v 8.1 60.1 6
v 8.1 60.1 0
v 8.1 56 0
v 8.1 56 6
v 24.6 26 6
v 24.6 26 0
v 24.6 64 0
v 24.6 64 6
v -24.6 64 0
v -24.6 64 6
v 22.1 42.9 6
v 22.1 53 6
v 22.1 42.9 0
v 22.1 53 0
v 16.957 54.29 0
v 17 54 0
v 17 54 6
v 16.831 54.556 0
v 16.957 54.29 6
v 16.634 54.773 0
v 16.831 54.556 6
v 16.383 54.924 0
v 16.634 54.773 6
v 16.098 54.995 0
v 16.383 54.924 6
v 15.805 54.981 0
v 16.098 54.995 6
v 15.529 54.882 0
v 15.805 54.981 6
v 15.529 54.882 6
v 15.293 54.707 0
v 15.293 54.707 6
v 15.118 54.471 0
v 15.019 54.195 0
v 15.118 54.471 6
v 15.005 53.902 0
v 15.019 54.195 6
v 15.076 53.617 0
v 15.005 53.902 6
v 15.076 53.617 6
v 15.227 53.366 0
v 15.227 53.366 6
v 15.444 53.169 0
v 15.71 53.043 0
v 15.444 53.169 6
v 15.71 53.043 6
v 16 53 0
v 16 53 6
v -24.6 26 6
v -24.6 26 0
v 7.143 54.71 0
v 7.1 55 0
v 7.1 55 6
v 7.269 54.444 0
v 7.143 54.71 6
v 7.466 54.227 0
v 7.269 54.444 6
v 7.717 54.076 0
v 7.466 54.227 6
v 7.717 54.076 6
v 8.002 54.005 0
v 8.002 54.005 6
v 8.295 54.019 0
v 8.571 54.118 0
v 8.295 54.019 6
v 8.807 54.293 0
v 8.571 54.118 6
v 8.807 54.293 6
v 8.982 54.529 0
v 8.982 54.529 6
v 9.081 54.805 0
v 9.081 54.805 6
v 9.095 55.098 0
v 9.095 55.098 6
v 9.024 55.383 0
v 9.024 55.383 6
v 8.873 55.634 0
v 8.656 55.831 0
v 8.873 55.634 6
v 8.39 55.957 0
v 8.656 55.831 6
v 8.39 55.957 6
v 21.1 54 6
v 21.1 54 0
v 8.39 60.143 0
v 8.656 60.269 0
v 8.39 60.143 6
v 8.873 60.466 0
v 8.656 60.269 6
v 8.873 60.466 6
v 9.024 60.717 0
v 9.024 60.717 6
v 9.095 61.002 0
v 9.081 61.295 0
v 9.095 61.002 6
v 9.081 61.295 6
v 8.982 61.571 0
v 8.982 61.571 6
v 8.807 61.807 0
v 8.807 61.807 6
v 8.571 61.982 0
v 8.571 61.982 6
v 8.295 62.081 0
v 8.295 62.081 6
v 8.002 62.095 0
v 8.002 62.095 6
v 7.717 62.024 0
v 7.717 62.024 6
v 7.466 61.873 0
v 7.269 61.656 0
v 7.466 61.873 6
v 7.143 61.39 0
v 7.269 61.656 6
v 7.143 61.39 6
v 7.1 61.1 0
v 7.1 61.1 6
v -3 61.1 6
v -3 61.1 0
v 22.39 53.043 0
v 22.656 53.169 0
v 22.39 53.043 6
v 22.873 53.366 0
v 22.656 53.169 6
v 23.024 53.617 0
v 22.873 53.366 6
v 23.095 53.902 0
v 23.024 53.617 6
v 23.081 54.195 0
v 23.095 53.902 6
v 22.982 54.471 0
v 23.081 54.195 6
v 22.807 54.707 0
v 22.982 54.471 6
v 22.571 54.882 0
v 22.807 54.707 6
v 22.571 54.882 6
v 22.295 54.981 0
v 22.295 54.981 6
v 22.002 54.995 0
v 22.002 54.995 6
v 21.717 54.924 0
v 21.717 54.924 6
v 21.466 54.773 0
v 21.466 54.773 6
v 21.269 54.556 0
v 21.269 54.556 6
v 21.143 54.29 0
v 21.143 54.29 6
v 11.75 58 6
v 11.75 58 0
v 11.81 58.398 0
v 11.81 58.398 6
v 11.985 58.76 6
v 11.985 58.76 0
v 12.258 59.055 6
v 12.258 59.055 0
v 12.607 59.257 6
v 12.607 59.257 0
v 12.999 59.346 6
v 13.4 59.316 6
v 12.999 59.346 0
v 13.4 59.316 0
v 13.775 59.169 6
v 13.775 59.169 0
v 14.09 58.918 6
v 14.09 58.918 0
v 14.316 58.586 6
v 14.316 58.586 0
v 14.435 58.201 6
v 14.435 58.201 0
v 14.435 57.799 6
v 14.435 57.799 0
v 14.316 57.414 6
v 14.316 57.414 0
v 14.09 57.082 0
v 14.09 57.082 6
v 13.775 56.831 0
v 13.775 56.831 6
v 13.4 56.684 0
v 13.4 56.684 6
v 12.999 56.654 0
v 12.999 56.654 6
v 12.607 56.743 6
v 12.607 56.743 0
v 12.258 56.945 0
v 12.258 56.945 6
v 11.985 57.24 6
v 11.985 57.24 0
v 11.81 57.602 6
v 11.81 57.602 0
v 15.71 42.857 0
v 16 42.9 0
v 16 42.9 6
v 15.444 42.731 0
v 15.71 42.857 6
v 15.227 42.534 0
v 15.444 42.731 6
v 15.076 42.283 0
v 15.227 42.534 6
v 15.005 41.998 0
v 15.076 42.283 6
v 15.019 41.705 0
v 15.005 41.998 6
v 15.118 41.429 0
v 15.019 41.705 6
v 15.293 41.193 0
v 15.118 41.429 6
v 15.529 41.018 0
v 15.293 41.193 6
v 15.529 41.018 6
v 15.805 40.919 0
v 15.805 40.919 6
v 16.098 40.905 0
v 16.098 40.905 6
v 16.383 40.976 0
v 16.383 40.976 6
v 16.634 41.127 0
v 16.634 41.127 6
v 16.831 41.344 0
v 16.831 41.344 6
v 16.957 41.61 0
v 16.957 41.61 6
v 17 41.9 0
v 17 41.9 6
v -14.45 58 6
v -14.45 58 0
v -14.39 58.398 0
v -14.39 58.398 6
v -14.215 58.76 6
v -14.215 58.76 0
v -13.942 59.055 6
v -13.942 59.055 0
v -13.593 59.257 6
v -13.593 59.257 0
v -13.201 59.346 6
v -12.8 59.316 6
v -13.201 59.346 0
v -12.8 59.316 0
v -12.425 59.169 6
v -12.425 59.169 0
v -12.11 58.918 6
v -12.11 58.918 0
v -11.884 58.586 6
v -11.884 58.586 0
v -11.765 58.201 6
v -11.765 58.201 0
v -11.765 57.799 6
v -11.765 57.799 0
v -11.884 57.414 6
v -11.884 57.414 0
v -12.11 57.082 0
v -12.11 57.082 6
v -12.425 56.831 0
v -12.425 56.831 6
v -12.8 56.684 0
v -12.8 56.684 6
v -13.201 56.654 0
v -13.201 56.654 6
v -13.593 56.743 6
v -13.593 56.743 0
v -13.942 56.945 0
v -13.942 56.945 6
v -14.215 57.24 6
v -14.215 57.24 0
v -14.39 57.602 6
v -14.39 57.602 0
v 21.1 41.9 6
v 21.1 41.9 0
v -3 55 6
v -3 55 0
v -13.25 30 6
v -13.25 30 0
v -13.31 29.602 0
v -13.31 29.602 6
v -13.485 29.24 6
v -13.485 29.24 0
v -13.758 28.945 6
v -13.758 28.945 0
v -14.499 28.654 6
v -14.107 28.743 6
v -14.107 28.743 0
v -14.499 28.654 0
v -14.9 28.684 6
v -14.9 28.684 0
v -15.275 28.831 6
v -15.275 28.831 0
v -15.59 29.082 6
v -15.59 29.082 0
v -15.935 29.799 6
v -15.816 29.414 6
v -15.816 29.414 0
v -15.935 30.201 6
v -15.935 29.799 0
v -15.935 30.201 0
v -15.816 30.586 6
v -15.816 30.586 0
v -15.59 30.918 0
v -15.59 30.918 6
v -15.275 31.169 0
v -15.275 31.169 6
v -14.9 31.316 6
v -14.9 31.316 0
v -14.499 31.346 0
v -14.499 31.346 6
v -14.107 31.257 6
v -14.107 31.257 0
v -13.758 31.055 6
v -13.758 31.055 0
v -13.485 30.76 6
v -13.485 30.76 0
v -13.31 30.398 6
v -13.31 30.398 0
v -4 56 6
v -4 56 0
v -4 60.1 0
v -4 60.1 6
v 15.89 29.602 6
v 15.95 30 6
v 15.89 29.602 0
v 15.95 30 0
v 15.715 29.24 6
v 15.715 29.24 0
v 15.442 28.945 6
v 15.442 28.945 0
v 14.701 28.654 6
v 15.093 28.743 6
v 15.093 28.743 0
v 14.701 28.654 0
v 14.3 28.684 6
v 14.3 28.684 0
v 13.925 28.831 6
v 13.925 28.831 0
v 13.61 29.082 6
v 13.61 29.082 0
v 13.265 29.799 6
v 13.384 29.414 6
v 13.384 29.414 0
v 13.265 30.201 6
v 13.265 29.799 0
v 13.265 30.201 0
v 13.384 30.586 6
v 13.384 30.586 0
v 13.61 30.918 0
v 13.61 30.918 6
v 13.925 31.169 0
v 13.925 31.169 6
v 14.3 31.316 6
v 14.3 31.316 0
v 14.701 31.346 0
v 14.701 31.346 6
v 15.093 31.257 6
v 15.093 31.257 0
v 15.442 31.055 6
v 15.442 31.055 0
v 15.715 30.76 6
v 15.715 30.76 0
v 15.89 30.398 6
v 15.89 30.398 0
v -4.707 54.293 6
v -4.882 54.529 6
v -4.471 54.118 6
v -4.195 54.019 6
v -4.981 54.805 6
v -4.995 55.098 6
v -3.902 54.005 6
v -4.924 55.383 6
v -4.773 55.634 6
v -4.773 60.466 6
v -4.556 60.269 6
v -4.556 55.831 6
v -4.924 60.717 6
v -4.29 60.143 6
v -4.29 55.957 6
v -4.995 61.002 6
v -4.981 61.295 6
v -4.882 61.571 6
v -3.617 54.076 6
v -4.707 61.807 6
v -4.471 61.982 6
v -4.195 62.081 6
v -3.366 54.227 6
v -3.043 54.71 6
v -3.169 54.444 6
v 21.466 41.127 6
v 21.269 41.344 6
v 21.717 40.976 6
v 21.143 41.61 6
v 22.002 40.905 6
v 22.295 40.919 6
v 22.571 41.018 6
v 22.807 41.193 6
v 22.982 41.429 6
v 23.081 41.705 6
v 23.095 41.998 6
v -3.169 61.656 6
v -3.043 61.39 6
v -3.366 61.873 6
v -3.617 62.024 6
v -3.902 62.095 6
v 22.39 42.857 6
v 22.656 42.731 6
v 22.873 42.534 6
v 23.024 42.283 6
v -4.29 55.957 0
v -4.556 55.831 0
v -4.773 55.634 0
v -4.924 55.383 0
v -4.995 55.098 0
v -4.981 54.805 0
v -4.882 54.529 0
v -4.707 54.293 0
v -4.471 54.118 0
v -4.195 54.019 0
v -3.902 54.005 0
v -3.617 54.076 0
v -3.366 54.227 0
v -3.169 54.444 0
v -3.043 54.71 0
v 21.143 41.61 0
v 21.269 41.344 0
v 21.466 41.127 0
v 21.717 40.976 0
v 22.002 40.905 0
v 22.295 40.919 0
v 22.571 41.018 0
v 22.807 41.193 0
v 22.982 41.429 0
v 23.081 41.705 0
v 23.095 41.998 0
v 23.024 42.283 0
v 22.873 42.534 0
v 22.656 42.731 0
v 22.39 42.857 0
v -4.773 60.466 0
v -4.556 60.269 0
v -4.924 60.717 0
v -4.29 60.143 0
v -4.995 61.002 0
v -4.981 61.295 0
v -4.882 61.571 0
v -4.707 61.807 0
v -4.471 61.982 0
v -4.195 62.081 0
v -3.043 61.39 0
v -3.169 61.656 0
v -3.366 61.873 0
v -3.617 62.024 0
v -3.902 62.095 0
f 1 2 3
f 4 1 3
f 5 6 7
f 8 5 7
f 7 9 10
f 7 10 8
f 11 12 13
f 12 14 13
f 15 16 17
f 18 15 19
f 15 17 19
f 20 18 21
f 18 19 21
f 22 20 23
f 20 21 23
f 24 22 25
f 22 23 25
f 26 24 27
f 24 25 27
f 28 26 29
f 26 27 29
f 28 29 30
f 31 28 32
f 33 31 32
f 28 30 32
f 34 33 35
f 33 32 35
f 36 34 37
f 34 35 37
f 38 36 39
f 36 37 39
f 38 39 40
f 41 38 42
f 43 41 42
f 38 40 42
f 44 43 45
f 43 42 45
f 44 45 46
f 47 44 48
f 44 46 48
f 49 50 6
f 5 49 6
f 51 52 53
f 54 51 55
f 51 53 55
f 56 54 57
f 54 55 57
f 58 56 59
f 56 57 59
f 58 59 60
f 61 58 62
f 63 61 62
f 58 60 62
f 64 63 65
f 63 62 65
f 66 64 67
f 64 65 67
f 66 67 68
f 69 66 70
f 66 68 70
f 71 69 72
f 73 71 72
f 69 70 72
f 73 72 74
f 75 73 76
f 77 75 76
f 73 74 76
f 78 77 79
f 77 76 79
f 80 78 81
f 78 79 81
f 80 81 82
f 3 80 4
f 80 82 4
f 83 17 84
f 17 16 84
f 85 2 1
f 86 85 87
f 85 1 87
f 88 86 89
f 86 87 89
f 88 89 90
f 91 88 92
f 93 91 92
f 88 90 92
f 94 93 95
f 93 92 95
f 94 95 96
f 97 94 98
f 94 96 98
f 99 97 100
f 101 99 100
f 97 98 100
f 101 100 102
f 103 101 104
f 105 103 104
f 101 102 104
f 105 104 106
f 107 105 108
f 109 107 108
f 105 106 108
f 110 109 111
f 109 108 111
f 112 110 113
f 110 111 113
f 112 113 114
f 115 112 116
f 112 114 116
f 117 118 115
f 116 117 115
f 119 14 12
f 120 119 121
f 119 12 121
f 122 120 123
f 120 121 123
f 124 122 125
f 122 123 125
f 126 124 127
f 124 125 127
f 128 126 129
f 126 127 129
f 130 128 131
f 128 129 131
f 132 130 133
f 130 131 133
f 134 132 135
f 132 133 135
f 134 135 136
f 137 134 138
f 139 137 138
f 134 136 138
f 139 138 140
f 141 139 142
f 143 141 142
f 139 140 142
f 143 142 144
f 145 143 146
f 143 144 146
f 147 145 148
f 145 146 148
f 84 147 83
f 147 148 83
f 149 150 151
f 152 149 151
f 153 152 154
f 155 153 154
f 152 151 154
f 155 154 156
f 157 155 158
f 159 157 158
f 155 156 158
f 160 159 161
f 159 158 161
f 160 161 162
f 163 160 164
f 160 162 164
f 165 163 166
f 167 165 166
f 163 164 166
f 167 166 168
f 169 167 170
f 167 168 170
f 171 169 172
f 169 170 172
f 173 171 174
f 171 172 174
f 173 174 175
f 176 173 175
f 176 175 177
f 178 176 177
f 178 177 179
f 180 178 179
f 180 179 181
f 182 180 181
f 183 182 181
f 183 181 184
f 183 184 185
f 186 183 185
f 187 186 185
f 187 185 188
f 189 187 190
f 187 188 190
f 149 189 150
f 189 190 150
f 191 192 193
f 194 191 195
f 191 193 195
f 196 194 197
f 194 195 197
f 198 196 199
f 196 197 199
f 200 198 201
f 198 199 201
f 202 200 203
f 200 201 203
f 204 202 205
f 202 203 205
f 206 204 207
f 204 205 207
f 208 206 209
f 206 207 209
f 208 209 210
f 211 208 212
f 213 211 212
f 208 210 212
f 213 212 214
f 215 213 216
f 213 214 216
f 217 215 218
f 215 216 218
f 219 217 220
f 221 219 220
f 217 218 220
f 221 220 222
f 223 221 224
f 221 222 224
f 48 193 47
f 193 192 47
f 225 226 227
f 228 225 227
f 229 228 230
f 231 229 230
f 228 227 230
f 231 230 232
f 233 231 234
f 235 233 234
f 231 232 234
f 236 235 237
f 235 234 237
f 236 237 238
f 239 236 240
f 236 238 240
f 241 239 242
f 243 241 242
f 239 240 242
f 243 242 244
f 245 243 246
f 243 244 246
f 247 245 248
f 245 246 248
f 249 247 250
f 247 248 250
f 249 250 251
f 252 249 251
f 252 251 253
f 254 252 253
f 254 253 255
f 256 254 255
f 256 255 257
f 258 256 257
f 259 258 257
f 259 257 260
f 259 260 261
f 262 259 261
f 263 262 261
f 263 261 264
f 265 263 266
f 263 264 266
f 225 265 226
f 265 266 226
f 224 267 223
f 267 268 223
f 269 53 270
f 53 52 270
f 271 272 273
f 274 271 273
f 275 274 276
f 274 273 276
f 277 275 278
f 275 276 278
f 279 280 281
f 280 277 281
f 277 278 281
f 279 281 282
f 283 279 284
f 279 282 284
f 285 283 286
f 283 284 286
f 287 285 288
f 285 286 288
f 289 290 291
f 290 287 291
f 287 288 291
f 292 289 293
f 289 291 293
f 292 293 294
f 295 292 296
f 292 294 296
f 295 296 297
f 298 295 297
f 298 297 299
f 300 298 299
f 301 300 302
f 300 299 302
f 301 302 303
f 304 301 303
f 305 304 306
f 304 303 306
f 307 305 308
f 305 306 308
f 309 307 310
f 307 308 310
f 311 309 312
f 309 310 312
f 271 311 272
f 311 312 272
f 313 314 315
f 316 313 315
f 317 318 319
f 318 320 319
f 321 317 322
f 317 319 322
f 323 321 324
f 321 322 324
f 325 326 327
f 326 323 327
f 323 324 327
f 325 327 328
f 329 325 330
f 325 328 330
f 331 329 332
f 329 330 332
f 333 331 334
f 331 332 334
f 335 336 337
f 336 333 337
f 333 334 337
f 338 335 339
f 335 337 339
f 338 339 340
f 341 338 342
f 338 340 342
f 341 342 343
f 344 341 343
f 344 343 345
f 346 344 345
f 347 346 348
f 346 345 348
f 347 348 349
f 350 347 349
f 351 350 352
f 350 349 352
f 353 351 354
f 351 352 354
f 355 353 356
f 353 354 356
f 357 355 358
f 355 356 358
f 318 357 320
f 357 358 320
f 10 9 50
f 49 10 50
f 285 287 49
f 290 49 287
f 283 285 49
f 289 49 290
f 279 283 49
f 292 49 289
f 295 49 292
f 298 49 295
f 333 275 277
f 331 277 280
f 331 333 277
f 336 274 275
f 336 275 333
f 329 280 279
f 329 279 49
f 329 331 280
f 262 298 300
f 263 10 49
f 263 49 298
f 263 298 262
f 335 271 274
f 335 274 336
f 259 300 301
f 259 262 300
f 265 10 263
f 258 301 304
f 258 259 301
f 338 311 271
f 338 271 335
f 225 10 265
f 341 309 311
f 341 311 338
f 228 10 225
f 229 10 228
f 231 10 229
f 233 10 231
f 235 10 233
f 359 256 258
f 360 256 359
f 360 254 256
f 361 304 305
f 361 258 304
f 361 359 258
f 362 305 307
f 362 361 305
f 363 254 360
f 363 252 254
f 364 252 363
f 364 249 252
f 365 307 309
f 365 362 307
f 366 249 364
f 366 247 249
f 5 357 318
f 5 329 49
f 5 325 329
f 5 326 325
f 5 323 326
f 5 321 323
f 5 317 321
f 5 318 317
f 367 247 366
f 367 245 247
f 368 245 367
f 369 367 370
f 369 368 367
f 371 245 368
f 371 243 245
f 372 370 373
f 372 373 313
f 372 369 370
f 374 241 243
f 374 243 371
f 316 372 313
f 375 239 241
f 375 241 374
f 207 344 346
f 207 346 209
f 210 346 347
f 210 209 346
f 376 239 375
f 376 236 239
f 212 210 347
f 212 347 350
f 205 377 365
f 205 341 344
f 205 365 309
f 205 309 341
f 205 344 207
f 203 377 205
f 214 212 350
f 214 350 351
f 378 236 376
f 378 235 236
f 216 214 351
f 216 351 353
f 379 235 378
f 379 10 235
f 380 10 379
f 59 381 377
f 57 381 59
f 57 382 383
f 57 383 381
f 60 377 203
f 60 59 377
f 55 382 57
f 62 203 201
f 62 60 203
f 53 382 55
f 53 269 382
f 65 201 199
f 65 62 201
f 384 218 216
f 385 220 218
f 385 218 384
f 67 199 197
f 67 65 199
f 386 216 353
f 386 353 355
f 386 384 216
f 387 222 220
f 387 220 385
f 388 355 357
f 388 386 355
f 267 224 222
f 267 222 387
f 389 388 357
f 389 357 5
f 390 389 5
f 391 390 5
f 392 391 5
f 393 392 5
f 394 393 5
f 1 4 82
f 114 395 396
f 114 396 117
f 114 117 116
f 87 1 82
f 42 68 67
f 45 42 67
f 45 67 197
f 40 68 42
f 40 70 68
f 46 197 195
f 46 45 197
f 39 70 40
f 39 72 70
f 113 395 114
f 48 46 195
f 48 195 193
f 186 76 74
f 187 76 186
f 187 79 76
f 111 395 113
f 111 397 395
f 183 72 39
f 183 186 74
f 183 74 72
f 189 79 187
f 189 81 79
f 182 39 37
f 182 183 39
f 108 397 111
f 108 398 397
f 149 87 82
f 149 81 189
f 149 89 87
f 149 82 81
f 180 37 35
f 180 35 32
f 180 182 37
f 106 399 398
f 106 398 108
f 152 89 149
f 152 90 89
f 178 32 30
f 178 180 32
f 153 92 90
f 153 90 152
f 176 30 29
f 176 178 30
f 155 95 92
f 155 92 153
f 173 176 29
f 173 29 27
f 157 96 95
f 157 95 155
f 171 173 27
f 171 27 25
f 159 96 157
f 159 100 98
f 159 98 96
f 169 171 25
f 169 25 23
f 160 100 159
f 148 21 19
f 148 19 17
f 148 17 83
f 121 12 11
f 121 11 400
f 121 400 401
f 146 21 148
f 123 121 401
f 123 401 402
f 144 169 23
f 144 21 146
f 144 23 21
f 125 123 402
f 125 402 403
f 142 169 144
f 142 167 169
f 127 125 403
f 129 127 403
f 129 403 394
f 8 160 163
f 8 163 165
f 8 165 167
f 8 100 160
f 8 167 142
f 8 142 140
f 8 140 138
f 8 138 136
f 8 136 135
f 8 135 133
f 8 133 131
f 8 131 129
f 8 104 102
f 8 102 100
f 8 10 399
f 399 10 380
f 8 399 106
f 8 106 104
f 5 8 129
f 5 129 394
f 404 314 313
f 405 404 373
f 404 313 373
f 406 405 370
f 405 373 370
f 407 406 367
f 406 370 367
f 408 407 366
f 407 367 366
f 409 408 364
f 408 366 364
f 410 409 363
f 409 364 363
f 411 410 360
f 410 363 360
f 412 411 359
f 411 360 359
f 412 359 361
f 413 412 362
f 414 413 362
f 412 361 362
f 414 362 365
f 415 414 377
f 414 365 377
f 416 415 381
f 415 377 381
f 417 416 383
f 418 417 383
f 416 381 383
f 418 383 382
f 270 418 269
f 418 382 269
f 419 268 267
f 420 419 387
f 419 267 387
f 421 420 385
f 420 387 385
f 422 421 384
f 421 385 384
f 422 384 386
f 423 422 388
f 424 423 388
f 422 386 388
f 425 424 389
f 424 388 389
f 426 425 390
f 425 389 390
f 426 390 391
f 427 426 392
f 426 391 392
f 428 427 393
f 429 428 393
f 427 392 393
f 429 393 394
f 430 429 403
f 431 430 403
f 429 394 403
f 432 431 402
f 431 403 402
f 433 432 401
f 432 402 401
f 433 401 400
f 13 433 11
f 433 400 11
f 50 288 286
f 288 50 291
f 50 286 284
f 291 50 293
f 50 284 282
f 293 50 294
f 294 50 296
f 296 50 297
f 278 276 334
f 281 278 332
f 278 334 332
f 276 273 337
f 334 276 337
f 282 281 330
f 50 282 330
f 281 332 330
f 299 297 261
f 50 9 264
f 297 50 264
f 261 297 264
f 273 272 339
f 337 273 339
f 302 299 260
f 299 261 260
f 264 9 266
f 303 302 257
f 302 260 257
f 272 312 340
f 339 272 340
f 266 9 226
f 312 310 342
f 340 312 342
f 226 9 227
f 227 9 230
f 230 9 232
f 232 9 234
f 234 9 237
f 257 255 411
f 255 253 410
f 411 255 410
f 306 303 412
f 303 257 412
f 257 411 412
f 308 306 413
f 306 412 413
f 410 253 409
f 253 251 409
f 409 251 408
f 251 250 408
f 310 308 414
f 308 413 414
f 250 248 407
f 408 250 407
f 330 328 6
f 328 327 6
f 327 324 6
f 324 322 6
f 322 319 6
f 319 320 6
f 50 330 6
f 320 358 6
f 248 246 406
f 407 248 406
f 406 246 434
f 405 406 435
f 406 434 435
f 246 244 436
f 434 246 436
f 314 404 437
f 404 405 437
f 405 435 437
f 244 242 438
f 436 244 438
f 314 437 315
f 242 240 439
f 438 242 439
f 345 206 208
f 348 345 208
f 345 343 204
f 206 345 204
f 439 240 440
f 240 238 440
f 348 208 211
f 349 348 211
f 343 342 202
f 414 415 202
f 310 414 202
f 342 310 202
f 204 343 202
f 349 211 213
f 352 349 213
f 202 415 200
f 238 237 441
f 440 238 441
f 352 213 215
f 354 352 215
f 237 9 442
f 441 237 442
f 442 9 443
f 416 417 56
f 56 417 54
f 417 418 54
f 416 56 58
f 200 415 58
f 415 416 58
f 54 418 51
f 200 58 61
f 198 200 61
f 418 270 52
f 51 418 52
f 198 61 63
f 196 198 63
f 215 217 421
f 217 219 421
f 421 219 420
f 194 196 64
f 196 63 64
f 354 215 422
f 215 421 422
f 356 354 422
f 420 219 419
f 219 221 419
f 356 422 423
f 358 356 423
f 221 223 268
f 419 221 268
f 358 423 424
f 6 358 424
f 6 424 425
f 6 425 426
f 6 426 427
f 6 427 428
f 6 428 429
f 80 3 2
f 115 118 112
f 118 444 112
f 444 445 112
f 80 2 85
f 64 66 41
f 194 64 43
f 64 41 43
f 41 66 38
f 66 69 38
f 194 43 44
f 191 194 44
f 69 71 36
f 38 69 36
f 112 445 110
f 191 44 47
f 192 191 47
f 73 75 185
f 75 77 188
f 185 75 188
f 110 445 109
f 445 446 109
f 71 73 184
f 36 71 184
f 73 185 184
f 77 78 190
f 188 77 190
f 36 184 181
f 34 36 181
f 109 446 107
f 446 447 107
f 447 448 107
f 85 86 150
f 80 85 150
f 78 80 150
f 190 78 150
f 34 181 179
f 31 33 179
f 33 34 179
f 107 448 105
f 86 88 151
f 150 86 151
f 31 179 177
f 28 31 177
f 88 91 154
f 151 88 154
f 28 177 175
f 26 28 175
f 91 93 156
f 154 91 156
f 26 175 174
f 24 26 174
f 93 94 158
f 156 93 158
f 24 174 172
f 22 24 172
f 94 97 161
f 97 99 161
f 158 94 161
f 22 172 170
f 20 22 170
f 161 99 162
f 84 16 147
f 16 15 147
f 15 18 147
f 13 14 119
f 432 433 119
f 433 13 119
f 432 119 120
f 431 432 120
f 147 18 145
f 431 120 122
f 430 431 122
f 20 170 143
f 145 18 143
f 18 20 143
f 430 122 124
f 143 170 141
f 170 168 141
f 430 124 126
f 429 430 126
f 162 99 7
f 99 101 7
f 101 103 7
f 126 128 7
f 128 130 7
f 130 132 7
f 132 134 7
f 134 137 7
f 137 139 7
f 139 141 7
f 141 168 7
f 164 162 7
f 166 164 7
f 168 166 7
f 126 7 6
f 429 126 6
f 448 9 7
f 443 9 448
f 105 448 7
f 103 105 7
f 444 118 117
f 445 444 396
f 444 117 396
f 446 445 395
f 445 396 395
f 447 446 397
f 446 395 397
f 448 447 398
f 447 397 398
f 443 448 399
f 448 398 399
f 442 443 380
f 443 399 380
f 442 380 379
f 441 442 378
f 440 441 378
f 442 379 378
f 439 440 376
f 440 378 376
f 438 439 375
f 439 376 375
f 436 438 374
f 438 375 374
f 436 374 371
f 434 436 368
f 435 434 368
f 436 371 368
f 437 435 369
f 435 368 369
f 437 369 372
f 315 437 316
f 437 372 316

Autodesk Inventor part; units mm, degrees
ref_plane "YZ Plane" through (0, 0, 0) normal (1, 0, 0) x (0, 1, 0)
ref_plane "XZ Plane" through (0, 0, 0) normal (0, 1, 0) x (-1, 0, 0)
ref_plane "XY Plane" through (0, 0, 0) normal (0, 0, 1) x (1, 0, 0)
ref_plane "작업 평면1" through (0, 0, 0) normal (0, 0, 1) x (1, 0, 0)
sketch "스케치1" plane through (0, 0, 0) normal (0, 0, 1) x (1, 0, 0)
  line L0 (14.6, 27) -> (14.6, -35) projected
  line L1 (14.6, -35) -> (24.6, -35) projected
  line L2 (24.6, -35) -> (24.6, 35) projected
  line L3 (24.6, 35) -> (-24.6, 35) projected
  line L4 (-24.6, 35) -> (-24.6, -35) projected
  line L5 (-24.6, -35) -> (-14.6, -35) projected
  line L6 (-14.6, -35) -> (-14.6, 27) projected
  line L7 (-14.6, 27) -> (14.6, 27) projected
  circle A0 centre (-14.6, 30) radius 1.35 projected
  circle A1 centre (14.6, 30) radius 1.35 projected
  circle A2 centre (-17.3, -31) radius 1.35 projected
  circle A3 centre (-17.3, 13) radius 1.35 projected
  circle A4 centre (-17.3, -9) radius 1.35 projected
  circle A5 centre (17.3, -9) radius 1.35 projected
  circle A6 centre (17.3, 13) radius 1.35 projected
  circle A7 centre (17.3, -31) radius 1.35 projected
  line L8 (-24.6, 26) -> (24.6, 26)
  line L9 (24.6, 26) -> (24.6, 64)
  line L10 (-24.6, 64) -> (-24.6, 26)
  line L11 (22.1, 41.9) -> (16, 41.9)
  line L12 (16, 41.9) -> (16, 54)
  line L13 (16, 54) -> (22.1, 54)
  line L14 (22.1, 54) -> (22.1, 41.9)
  line L15 (8.1, 55) -> (-4, 55)
  line L16 (-4, 55) -> (-4, 61.1)
  line L17 (-4, 61.1) -> (8.1, 61.1)
  line L18 (8.1, 61.1) -> (8.1, 55)
  line L19 (-4, 64) -> (24.6, 64)
  line L20 (-24.6, 64) -> (-4, 64)
  point P0 (0, 0)
  dimension "d1" = 6.1
  dimension "d2" = 12.1
  dimension "d11" = 6.1
extrude "돌출2" add sketch "스케치1" along normal blind 6 contours L7 L6 L8 L4 L3 L2 L0 | L0 L8 L6 L7 | L3 L10 L20 L19 L9
sketch "스케치2" plane through (0, 0, 0) normal (0, 0, -1) x (-1, 0, 0)
  line L0 (-8.1, 61.1) -> (-8.1, 55) projected
  circle A0 centre (-13.1, 58) radius 1.35
  circle A1 centre (13.1, 58) radius 1.35
  point P0 (0, 0)
  dimension "d14" = 2.7
  dimension "d15" = 2.7
extrude "돌출3" cut sketch "스케치2" against normal through all
sketch "스케치3" plane through (0, 0, 6) normal (0, 0, 1) x (1, 0, 0)
  line L0 (8.1, 55) -> (-4, 55) projected
  line L1 (8.1, 61.1) -> (8.1, 55) projected
  line L2 (-4, 61.1) -> (8.1, 61.1) projected
  line L3 (-4, 55) -> (-4, 61.1) projected
  line L4 (16, 54) -> (22.1, 54) projected
  line L5 (22.1, 41.9) -> (16, 41.9) projected
  line L6 (22.1, 54) -> (22.1, 41.9) projected
  line L7 (16, 41.9) -> (16, 54) projected
  circle A0 centre (-4, 61.1) radius 1
  circle A1 centre (8.1, 61.1) radius 1
  circle A2 centre (8.1, 55) radius 1
  circle A3 centre (-4, 55) radius 1
  circle A4 centre (16, 54) radius 1
  circle A5 centre (22.1, 54) radius 1
  circle A6 centre (22.1, 41.9) radius 1
  circle A7 centre (16, 41.9) radius 1
  point P0 (0, 0)
  point P1 (22.1, 53)
  point P2 (21.1, 54)
  dimension "d18" = 2
  dimension "d19" = 2
  dimension "d20" = 2
  dimension "d21" = 2
  dimension "d22" = 2
  dimension "d23" = 2
  dimension "d24" = 2
  dimension "d25" = 2
extrude "돌출4" cut sketch "스케치3" against normal blind 10 contours A3 L3 L0 | L0 L3 A3 | A2 L1 L0 | L0 L1 A2 | A0 L2 L3 | L3 L2 A0 | A1 L2 L1 | L1 L2 A1 | L7 A4 L4 | L4 A4 L7 | A5 L6 L4 | A7 L5 L7 | L7 L5 A7 | A6 L5 L6 | L6 L5 A6 picked at (21.7924, 54.586)
properties part number "battery sideplate" material "PMMA 플라스틱"
